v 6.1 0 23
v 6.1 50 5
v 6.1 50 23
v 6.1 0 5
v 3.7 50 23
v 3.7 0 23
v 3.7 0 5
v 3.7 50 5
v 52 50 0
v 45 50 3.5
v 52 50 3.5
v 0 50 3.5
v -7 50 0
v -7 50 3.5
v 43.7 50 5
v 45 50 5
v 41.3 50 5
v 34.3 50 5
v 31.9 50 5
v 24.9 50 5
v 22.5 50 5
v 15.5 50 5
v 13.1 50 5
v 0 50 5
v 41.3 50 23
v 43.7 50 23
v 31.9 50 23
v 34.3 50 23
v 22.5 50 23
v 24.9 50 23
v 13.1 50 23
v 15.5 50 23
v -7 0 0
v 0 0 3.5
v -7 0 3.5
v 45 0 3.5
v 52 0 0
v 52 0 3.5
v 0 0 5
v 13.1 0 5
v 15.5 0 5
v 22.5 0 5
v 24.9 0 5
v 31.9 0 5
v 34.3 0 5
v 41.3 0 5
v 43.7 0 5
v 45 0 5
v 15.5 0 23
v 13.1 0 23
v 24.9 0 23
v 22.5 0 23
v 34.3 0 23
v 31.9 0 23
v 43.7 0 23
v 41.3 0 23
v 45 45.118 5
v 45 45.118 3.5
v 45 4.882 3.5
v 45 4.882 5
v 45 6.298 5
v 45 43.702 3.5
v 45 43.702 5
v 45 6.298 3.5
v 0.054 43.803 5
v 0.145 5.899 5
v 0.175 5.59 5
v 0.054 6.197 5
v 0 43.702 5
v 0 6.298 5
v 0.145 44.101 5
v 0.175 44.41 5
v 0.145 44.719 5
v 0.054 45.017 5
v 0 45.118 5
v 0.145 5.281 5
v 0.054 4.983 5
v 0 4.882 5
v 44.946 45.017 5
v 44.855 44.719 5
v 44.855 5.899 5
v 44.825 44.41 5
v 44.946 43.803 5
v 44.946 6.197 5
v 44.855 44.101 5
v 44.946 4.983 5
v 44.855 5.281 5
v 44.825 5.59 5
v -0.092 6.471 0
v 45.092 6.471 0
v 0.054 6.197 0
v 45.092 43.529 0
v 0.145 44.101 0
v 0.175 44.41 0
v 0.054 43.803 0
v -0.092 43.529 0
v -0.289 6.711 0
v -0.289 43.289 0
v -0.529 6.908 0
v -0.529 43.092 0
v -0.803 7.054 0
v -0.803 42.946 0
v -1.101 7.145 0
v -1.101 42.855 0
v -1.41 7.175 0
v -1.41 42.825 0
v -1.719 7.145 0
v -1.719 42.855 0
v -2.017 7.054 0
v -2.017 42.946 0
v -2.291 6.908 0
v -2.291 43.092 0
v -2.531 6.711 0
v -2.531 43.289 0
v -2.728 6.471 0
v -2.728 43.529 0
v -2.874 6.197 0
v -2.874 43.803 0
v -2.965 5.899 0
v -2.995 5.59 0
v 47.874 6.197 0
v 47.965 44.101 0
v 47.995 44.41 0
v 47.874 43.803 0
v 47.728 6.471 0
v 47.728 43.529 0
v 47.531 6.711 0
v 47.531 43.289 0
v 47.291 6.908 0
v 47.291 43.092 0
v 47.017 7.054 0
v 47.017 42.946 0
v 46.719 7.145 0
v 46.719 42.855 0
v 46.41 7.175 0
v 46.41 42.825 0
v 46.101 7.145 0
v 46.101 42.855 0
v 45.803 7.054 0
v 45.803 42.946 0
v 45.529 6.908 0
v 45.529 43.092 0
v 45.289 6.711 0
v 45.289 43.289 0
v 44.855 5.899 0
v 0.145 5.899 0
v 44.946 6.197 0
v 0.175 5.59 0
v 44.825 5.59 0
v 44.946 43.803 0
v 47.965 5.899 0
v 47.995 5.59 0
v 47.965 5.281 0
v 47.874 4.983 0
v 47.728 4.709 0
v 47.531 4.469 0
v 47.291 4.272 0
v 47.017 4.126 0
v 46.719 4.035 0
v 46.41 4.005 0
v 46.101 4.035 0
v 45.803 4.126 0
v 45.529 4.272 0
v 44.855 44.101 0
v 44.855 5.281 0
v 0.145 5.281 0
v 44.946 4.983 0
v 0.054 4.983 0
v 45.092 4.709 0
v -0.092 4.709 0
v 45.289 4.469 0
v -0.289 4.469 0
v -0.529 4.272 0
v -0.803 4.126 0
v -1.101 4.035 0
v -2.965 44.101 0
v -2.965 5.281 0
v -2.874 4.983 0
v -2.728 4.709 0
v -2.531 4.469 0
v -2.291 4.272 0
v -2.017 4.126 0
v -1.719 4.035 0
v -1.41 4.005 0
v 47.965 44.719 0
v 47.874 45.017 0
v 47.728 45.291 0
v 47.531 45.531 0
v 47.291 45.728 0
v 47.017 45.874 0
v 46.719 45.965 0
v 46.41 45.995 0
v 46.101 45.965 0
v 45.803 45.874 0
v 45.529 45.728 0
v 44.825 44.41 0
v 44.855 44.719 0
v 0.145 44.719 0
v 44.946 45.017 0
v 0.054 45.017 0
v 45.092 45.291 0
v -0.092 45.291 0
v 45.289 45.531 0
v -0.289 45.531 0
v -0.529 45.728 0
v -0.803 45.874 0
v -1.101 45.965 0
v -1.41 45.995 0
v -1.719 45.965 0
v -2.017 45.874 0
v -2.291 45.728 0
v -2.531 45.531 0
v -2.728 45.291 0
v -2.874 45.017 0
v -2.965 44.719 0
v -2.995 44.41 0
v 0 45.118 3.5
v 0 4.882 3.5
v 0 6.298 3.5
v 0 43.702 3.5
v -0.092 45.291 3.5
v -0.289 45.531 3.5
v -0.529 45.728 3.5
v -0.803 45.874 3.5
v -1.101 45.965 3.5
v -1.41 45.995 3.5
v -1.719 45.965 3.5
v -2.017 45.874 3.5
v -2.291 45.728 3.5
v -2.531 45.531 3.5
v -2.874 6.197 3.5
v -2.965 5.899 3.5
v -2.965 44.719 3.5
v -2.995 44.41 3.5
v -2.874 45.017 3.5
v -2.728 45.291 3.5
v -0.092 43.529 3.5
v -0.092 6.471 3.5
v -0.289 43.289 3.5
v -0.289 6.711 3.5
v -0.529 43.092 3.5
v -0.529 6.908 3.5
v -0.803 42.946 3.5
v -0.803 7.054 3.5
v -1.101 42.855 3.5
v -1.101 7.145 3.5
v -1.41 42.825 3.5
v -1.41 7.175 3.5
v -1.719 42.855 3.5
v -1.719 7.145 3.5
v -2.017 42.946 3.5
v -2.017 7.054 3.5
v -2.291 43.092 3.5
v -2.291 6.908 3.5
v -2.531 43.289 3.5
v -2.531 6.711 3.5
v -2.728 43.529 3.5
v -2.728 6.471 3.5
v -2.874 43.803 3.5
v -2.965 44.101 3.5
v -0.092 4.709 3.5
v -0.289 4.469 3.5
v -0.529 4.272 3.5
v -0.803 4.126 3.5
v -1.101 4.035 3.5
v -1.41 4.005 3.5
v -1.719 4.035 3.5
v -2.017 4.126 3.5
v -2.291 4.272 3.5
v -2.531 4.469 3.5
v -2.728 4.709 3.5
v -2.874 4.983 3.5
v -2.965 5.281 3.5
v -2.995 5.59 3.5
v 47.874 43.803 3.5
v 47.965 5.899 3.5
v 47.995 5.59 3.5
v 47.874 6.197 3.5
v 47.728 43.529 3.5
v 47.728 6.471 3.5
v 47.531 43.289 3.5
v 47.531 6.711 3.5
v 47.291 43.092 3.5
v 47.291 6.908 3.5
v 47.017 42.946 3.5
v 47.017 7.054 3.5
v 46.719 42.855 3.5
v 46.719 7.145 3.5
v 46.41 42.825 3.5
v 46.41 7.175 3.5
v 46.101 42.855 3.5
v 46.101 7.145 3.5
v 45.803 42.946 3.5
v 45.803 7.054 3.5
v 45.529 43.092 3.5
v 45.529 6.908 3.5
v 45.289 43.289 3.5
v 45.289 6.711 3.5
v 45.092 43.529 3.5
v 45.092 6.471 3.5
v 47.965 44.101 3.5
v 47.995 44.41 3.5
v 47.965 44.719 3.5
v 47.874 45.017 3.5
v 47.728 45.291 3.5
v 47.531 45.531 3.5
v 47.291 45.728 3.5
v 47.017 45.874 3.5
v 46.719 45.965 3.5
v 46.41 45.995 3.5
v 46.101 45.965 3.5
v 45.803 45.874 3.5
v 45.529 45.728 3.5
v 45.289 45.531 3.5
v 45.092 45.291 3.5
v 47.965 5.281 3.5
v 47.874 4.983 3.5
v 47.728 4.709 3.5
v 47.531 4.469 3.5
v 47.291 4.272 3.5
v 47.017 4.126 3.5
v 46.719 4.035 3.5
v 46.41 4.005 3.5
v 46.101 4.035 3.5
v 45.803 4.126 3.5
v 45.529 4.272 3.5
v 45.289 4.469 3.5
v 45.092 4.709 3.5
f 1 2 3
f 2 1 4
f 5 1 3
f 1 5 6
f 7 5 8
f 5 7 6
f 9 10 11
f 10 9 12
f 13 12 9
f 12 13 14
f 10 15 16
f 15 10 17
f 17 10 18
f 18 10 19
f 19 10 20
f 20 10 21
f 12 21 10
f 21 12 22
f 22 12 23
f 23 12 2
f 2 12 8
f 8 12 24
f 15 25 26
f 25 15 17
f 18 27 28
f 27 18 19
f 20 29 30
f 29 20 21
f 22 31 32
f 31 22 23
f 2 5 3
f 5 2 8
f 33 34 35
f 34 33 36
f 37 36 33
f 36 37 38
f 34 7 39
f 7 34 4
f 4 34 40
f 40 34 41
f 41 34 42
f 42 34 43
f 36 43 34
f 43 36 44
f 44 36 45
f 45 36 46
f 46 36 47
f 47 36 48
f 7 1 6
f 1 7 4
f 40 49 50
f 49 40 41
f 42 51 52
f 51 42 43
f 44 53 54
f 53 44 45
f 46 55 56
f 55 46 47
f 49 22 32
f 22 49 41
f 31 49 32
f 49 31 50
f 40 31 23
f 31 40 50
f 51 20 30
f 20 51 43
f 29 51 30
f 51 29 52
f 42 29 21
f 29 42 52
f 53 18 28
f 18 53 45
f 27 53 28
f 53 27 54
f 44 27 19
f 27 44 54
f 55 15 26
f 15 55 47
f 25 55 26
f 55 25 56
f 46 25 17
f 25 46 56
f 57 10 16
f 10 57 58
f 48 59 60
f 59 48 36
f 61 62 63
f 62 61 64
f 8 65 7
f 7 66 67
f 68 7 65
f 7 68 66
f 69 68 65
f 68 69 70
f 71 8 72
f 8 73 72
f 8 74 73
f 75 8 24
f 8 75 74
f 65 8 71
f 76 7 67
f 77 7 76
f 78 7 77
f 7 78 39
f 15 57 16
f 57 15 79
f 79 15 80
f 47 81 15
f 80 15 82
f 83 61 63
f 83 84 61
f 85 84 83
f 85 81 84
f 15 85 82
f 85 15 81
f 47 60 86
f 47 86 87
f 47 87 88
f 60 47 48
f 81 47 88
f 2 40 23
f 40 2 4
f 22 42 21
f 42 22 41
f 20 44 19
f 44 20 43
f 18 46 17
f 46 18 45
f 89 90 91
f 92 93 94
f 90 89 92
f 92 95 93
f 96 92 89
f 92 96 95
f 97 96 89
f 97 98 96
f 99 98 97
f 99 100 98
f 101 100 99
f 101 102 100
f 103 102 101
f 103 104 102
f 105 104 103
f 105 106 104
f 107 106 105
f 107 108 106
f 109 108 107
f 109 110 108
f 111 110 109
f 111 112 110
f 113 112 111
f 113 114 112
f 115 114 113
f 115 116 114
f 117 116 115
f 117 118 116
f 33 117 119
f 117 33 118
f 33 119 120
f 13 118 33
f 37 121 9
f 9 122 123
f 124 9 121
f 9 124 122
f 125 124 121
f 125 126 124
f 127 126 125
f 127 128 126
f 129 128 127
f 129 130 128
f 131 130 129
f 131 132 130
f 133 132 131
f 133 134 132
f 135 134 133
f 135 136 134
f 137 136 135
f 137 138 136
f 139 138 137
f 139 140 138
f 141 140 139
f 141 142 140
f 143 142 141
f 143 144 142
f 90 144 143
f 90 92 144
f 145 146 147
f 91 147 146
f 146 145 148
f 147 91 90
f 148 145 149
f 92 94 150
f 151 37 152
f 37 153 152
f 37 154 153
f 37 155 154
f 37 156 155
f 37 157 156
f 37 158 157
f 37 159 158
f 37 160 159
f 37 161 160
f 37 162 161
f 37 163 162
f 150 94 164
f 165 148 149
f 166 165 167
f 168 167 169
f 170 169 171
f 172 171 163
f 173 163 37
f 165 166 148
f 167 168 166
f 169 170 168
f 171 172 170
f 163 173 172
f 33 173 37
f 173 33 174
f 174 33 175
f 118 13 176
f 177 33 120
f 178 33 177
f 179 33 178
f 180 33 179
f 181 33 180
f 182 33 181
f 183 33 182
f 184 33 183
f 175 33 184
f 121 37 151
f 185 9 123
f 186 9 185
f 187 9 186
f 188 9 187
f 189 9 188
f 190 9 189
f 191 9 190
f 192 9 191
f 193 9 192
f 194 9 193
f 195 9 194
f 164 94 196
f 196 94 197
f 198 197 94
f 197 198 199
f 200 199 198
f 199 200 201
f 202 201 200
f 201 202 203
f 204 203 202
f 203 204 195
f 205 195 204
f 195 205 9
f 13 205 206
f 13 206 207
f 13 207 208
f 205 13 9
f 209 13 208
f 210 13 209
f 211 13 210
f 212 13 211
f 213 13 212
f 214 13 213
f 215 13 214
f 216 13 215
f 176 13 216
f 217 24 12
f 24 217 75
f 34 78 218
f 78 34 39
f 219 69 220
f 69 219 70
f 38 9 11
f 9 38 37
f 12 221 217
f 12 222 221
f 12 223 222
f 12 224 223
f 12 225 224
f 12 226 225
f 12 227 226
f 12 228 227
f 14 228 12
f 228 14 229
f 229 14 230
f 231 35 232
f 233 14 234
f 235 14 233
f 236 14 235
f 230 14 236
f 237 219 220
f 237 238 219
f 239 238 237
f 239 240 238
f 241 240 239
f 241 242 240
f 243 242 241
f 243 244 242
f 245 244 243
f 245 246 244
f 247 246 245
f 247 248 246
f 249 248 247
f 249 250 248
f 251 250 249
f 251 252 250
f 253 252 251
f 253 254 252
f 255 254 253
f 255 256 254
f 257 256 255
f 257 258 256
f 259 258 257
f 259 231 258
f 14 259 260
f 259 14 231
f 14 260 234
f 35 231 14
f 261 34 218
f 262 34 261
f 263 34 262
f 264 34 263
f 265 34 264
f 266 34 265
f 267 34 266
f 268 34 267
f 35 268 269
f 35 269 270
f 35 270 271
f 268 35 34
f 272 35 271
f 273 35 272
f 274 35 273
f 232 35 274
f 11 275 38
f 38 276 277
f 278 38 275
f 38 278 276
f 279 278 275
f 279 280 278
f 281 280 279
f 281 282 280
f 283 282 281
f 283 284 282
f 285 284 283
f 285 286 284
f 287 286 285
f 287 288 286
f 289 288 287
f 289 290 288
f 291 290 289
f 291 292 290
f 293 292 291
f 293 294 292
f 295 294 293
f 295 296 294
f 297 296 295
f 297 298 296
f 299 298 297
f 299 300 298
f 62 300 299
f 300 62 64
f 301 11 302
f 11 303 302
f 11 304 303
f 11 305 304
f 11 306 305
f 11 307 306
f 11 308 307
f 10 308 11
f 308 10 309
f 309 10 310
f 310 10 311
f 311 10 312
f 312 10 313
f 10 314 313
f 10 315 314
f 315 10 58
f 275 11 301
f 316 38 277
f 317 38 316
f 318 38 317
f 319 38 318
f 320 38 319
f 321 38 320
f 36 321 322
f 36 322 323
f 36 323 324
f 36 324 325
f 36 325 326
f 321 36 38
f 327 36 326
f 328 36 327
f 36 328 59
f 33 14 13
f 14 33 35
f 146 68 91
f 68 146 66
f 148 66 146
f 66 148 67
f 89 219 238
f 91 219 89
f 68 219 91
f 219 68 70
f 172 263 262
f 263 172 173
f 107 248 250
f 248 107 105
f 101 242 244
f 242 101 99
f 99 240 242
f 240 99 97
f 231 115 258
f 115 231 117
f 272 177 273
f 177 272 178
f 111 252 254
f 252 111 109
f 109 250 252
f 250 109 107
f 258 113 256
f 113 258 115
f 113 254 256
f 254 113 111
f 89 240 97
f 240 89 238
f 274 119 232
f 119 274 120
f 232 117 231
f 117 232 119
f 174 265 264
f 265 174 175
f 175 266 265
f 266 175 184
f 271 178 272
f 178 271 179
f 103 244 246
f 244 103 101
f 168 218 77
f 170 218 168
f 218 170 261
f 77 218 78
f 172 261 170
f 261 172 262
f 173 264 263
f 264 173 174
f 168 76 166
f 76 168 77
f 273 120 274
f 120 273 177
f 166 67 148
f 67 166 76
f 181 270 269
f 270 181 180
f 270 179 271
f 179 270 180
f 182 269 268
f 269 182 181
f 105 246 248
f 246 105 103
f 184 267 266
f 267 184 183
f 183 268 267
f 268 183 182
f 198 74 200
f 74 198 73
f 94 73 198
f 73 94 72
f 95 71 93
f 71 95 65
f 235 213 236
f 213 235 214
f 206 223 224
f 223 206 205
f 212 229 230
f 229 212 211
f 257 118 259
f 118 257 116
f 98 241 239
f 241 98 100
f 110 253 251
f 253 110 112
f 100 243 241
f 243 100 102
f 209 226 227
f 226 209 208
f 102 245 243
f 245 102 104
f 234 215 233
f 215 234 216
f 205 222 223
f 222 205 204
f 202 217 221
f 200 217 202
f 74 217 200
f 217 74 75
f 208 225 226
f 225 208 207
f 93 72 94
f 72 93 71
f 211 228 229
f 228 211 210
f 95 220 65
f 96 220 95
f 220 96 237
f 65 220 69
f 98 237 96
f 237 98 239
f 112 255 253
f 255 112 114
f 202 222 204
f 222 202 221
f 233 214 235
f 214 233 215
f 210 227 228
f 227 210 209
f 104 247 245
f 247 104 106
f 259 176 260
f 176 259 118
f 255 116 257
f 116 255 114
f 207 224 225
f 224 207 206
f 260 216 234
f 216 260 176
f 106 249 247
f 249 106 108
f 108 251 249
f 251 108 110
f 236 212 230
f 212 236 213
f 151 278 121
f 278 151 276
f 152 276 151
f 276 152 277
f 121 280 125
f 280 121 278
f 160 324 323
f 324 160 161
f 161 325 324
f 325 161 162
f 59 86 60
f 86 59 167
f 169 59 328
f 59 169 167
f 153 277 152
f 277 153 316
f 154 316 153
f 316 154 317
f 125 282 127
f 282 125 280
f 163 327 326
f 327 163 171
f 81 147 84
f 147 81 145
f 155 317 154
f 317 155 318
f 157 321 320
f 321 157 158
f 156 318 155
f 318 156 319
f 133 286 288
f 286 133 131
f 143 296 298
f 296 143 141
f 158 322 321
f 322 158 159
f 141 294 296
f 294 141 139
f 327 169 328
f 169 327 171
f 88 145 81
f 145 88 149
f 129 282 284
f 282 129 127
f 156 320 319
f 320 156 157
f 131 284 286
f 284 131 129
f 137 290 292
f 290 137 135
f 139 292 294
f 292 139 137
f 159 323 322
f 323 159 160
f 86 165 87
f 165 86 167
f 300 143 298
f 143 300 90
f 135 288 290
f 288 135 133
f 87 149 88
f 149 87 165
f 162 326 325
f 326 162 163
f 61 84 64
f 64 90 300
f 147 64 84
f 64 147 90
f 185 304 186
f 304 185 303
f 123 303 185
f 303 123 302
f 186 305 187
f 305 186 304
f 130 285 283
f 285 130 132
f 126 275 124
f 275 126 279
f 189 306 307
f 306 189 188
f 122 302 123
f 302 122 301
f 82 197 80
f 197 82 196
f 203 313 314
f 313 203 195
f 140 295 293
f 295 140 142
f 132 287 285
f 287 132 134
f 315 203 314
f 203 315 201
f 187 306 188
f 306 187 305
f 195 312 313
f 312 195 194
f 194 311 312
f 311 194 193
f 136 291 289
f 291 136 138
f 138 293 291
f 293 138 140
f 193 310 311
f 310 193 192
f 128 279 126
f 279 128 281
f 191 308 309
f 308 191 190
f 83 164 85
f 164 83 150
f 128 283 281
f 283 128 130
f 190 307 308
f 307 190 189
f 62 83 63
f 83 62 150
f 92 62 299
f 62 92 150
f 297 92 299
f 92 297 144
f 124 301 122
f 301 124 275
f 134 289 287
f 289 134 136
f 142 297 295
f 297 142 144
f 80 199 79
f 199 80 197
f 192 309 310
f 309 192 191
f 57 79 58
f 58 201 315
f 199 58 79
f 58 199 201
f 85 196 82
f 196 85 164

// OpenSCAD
$fn = 32;

// ----------------------------------------------------------------------
// Finned heat sink: 45 x 50 mm base, 18 mm fins
// ----------------------------------------------------------------------

// --- parameters (mm) ---
base_w = 45;              // base width
base_d = 50;              // base depth
base_t = 5;               // base thickness
fin_h = 18;               // fin height above the base
holes_d = 3.17;           // fixing holes
hole_x = 23.91;           // hole offset in x
hole_y = 19.41;           // hole offset in y
fin_t = 2.4;              // fin thickness
fin_pitch = 9.4;          // fin pitch
fin_count = 5;            // number of fins
fin_x0 = 3.7;             // first fin offset
flange_w = 59;            // flange plate width
flange_t = 3;             // flange plate thickness

difference() {
  union() {
    cube([base_w, base_d, base_t]);
    for (i = [0 : fin_count - 1]) {
      translate([fin_x0 + i * fin_pitch, 0, base_t - 0.5]) cube([fin_t, base_d, fin_h + 0.5]);
    }
    /* mounting flange, a wider plate sharing the base bottom */
    translate([(base_w - flange_w) / 2, 0, 0]) cube([flange_w, base_d, flange_t + 0.5]);
  }
  /* fixing holes through the base, 2.5 mm clear on both sides */
  for (hx = [-23.91, 23.91]) {
    for (hy = [-19.41, 19.41]) {
      translate([base_w / 2 + hx, base_d / 2 + hy, -2.5]) cylinder(h = base_t + 5, d = holes_d);
    }
  }
}
